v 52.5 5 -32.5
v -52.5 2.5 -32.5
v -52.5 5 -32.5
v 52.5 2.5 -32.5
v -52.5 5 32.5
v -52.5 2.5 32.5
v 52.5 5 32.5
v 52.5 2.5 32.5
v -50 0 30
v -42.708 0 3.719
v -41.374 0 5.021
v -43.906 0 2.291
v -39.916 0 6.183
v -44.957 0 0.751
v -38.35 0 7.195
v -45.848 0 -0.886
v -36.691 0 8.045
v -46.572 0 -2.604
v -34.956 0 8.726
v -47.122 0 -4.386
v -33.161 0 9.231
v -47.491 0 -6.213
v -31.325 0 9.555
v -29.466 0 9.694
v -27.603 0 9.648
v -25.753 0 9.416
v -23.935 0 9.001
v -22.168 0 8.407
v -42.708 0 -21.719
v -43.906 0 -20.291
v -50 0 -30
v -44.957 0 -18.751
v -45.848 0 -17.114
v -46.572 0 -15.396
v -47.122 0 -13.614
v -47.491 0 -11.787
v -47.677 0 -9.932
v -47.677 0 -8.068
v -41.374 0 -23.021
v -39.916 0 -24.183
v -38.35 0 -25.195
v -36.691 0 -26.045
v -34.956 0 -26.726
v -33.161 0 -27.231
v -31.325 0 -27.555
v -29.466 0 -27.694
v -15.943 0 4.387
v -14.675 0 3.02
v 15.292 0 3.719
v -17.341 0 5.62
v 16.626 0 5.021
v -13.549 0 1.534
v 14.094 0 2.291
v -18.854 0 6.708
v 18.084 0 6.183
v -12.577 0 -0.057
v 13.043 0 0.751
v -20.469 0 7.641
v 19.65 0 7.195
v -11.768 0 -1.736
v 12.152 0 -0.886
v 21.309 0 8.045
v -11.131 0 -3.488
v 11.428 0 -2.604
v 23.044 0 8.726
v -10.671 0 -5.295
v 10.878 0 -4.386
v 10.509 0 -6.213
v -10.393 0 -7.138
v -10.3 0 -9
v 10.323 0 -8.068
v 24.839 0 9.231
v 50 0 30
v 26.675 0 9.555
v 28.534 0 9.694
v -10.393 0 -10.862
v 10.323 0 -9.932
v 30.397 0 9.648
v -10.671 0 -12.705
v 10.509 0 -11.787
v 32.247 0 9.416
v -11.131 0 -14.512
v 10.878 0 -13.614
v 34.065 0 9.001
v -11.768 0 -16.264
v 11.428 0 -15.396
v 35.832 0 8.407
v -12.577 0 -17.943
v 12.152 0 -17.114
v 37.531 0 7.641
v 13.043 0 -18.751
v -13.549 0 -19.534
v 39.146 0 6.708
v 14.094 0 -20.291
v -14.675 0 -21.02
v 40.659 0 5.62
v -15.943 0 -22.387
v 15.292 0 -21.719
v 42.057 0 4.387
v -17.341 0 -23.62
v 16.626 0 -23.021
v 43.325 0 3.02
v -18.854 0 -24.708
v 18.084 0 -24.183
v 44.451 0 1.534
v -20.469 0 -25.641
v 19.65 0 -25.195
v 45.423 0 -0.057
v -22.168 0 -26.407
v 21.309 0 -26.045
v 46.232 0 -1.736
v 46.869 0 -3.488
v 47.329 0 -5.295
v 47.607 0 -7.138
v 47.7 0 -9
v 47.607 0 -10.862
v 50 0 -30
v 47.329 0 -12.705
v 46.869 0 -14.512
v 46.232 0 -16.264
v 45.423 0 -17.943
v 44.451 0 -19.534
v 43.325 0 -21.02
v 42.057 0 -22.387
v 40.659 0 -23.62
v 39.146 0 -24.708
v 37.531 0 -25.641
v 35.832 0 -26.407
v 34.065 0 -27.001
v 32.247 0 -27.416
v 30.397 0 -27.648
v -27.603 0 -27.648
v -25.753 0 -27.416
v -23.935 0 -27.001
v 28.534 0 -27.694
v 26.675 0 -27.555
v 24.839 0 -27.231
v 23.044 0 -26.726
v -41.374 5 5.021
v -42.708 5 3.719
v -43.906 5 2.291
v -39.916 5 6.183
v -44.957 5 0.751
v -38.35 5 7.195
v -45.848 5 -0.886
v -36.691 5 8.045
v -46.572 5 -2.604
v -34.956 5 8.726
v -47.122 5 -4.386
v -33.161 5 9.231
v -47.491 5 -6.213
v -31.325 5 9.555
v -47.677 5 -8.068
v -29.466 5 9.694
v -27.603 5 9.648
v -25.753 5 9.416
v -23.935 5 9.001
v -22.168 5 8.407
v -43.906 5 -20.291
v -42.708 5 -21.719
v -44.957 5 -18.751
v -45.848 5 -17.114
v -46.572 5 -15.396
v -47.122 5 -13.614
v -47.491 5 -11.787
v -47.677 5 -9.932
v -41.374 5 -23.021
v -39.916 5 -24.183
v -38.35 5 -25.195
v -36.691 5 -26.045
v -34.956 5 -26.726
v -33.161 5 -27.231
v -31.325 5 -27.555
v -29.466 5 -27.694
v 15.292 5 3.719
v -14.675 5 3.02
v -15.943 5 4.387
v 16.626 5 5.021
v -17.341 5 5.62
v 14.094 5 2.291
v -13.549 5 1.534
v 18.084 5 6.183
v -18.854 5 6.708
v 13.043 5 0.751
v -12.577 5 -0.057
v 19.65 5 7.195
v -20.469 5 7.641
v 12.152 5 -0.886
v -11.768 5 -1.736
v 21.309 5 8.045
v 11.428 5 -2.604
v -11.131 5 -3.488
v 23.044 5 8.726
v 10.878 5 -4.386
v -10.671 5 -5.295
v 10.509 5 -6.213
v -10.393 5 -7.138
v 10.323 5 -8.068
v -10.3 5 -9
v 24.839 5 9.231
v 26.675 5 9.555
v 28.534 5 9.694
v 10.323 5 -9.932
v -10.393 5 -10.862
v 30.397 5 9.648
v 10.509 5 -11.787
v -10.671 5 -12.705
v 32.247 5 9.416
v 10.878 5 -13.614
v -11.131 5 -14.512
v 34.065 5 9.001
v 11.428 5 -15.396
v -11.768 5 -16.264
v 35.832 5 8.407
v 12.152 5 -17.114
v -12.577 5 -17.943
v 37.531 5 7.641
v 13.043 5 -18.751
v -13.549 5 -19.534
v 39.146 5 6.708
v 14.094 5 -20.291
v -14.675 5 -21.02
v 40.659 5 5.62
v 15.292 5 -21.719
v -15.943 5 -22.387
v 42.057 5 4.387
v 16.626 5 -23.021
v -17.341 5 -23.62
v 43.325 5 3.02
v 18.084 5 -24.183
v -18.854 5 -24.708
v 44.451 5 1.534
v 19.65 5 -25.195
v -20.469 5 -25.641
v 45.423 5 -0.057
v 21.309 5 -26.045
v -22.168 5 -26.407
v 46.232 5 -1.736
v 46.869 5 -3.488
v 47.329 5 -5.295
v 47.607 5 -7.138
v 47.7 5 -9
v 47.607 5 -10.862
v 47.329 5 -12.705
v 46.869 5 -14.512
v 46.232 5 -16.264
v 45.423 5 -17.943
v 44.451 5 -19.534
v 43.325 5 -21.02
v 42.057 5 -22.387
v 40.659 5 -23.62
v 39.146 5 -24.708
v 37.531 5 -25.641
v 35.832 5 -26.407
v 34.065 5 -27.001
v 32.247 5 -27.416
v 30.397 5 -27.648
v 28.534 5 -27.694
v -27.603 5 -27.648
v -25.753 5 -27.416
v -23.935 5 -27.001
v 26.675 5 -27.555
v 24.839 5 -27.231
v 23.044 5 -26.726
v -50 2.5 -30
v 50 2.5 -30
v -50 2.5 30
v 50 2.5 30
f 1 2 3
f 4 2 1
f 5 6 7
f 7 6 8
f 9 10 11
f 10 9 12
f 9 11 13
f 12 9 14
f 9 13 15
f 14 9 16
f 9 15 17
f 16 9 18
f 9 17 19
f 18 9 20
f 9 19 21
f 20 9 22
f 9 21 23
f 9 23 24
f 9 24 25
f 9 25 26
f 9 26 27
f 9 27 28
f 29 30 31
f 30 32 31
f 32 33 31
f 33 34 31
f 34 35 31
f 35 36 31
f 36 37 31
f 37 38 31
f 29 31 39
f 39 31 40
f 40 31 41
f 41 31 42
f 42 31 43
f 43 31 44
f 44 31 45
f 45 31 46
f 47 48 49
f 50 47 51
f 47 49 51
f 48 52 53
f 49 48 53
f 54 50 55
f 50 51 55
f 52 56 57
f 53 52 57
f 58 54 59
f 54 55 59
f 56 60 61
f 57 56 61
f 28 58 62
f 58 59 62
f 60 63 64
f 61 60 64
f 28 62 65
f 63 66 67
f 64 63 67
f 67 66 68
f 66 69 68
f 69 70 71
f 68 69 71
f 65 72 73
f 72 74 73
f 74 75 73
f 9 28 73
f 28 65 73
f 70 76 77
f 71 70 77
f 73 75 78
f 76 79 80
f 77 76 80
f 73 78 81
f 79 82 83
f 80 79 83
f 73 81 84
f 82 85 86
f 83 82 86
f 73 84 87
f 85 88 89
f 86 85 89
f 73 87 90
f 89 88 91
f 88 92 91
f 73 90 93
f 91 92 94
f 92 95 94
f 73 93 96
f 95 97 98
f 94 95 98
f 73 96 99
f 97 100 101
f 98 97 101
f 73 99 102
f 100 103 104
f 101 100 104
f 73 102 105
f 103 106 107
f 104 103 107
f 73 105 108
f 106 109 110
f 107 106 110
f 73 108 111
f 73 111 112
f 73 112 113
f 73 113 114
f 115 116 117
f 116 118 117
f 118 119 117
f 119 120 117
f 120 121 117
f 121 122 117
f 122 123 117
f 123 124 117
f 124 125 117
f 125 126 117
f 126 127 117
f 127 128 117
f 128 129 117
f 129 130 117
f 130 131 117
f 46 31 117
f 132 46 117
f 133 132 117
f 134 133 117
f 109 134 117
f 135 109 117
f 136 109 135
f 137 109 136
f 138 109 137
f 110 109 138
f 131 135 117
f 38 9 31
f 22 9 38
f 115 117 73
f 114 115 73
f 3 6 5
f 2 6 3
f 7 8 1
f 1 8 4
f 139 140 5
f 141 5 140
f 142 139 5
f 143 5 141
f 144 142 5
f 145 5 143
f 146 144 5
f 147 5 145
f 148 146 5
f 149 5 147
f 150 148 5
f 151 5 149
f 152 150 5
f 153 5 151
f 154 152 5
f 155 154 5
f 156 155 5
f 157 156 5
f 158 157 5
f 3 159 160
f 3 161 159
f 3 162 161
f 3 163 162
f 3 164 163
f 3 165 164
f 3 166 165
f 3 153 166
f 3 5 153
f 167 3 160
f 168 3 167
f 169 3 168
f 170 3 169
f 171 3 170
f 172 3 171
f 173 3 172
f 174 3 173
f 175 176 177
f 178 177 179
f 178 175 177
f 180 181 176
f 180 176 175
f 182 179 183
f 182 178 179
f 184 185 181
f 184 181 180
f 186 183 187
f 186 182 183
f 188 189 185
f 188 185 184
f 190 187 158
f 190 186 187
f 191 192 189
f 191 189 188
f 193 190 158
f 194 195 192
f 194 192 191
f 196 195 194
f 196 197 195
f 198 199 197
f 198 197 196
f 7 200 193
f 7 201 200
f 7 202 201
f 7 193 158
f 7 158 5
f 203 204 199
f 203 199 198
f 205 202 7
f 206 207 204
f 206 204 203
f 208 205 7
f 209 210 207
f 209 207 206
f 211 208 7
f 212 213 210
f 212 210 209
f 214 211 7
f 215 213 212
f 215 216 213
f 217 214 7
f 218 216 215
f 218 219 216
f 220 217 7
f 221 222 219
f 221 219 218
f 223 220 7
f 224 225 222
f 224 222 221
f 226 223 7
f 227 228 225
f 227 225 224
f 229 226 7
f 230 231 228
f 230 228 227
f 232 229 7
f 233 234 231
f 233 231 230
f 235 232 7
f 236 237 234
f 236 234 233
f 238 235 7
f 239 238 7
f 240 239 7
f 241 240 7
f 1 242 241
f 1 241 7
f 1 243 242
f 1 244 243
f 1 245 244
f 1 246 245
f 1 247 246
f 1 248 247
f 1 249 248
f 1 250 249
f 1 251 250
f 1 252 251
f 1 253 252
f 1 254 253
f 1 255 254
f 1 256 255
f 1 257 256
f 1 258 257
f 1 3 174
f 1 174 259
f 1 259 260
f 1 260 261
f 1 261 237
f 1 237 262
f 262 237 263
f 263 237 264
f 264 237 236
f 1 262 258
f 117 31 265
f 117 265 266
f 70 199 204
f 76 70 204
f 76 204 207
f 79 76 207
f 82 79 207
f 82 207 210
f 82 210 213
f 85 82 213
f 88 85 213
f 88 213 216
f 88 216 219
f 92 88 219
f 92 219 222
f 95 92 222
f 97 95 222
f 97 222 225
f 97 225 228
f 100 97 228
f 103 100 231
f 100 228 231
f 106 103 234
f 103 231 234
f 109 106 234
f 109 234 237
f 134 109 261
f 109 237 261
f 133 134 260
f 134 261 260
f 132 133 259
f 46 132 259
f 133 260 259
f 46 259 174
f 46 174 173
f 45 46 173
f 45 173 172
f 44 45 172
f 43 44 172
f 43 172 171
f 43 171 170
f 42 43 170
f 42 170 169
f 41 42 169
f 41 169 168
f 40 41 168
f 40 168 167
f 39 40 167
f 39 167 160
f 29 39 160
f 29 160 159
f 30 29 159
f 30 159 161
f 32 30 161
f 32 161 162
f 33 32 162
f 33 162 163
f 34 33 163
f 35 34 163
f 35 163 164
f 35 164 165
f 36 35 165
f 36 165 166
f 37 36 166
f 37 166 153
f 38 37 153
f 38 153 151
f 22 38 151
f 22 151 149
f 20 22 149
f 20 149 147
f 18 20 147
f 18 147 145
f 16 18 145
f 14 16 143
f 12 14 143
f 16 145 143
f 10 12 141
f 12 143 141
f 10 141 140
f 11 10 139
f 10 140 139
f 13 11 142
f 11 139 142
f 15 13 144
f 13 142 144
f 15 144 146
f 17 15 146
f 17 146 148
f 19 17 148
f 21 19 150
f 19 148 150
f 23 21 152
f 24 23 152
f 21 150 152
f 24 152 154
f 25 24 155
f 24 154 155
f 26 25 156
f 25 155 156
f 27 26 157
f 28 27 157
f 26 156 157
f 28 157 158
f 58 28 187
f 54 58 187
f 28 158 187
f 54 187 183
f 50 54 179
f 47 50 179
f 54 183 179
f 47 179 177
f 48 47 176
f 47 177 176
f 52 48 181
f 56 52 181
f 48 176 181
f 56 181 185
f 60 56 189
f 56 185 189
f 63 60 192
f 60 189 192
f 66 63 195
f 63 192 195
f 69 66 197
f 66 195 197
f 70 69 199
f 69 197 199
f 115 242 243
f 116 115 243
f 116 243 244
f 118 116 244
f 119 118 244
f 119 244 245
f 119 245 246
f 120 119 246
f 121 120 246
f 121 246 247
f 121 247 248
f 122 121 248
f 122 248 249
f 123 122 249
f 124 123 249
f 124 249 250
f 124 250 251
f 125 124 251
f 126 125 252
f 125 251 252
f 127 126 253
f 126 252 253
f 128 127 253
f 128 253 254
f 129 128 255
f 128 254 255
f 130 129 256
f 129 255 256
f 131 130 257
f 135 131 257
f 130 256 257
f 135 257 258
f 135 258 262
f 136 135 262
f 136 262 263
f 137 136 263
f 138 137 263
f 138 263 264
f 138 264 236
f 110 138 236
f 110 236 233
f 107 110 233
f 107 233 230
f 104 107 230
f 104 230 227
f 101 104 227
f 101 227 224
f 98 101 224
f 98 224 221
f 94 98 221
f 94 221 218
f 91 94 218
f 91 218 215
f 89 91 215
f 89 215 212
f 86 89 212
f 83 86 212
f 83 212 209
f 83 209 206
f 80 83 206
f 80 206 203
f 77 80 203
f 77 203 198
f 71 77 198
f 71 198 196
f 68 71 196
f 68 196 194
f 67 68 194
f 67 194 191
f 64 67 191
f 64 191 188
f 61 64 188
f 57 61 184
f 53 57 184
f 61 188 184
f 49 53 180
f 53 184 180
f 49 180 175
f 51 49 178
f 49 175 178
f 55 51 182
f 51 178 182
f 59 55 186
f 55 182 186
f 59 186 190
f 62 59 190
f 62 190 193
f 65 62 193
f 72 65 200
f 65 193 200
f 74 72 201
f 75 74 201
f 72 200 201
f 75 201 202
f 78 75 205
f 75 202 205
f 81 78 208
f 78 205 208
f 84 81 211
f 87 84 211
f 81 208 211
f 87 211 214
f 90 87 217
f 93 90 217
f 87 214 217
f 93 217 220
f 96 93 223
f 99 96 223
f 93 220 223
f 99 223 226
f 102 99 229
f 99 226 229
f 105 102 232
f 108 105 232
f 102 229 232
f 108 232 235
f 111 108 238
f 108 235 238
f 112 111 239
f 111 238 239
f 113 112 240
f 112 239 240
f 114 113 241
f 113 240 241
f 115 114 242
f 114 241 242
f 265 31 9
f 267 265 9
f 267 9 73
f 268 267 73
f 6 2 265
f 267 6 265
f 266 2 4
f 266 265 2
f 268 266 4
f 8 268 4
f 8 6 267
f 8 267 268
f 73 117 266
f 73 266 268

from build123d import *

# Parameters (mm, degrees)
SKETCH1_W           = 105
SKETCH1_H           = 65
BOSS_EXTRUDE1_DEPTH = 5
SKETCH2_W           = 105
SKETCH2_H           = 65
SKETCH2_W_2         = 100
SKETCH2_H_2         = 60
CUT_EXTRUDE1_DEPTH  = 2.5
SKETCH3_R           = 18.7
CUT_EXTRUDE2_DEPTH  = 50


with BuildPart() as part:
    # Sketch1 → Boss-Extrude1 (new body)
    with BuildSketch(Plane(origin=(0, 0, 0), x_dir=(1, 0, 0), z_dir=(0, 1, 0))):
        Rectangle(SKETCH1_W, SKETCH1_H)
    extrude(amount=BOSS_EXTRUDE1_DEPTH)

    # Sketch2 → Cut-Extrude1 (cut)
    with BuildSketch(Plane.XZ):
        Rectangle(SKETCH2_W, SKETCH2_H)
        Rectangle(SKETCH2_W_2, SKETCH2_H_2, mode=Mode.SUBTRACT)
    extrude(amount=-CUT_EXTRUDE1_DEPTH, mode=Mode.SUBTRACT)

    # Sketch3 → Cut-Extrude2 (cut)
    with BuildSketch(Plane(origin=(0, 5, 0), x_dir=(1, 0, 0), z_dir=(0, 1, 0))):
        with Locations((-29, 9)):
            Circle(SKETCH3_R)
        with Locations((29, 9)):
            Circle(SKETCH3_R)
    extrude(amount=-CUT_EXTRUDE2_DEPTH, mode=Mode.SUBTRACT)


solid = part.part
